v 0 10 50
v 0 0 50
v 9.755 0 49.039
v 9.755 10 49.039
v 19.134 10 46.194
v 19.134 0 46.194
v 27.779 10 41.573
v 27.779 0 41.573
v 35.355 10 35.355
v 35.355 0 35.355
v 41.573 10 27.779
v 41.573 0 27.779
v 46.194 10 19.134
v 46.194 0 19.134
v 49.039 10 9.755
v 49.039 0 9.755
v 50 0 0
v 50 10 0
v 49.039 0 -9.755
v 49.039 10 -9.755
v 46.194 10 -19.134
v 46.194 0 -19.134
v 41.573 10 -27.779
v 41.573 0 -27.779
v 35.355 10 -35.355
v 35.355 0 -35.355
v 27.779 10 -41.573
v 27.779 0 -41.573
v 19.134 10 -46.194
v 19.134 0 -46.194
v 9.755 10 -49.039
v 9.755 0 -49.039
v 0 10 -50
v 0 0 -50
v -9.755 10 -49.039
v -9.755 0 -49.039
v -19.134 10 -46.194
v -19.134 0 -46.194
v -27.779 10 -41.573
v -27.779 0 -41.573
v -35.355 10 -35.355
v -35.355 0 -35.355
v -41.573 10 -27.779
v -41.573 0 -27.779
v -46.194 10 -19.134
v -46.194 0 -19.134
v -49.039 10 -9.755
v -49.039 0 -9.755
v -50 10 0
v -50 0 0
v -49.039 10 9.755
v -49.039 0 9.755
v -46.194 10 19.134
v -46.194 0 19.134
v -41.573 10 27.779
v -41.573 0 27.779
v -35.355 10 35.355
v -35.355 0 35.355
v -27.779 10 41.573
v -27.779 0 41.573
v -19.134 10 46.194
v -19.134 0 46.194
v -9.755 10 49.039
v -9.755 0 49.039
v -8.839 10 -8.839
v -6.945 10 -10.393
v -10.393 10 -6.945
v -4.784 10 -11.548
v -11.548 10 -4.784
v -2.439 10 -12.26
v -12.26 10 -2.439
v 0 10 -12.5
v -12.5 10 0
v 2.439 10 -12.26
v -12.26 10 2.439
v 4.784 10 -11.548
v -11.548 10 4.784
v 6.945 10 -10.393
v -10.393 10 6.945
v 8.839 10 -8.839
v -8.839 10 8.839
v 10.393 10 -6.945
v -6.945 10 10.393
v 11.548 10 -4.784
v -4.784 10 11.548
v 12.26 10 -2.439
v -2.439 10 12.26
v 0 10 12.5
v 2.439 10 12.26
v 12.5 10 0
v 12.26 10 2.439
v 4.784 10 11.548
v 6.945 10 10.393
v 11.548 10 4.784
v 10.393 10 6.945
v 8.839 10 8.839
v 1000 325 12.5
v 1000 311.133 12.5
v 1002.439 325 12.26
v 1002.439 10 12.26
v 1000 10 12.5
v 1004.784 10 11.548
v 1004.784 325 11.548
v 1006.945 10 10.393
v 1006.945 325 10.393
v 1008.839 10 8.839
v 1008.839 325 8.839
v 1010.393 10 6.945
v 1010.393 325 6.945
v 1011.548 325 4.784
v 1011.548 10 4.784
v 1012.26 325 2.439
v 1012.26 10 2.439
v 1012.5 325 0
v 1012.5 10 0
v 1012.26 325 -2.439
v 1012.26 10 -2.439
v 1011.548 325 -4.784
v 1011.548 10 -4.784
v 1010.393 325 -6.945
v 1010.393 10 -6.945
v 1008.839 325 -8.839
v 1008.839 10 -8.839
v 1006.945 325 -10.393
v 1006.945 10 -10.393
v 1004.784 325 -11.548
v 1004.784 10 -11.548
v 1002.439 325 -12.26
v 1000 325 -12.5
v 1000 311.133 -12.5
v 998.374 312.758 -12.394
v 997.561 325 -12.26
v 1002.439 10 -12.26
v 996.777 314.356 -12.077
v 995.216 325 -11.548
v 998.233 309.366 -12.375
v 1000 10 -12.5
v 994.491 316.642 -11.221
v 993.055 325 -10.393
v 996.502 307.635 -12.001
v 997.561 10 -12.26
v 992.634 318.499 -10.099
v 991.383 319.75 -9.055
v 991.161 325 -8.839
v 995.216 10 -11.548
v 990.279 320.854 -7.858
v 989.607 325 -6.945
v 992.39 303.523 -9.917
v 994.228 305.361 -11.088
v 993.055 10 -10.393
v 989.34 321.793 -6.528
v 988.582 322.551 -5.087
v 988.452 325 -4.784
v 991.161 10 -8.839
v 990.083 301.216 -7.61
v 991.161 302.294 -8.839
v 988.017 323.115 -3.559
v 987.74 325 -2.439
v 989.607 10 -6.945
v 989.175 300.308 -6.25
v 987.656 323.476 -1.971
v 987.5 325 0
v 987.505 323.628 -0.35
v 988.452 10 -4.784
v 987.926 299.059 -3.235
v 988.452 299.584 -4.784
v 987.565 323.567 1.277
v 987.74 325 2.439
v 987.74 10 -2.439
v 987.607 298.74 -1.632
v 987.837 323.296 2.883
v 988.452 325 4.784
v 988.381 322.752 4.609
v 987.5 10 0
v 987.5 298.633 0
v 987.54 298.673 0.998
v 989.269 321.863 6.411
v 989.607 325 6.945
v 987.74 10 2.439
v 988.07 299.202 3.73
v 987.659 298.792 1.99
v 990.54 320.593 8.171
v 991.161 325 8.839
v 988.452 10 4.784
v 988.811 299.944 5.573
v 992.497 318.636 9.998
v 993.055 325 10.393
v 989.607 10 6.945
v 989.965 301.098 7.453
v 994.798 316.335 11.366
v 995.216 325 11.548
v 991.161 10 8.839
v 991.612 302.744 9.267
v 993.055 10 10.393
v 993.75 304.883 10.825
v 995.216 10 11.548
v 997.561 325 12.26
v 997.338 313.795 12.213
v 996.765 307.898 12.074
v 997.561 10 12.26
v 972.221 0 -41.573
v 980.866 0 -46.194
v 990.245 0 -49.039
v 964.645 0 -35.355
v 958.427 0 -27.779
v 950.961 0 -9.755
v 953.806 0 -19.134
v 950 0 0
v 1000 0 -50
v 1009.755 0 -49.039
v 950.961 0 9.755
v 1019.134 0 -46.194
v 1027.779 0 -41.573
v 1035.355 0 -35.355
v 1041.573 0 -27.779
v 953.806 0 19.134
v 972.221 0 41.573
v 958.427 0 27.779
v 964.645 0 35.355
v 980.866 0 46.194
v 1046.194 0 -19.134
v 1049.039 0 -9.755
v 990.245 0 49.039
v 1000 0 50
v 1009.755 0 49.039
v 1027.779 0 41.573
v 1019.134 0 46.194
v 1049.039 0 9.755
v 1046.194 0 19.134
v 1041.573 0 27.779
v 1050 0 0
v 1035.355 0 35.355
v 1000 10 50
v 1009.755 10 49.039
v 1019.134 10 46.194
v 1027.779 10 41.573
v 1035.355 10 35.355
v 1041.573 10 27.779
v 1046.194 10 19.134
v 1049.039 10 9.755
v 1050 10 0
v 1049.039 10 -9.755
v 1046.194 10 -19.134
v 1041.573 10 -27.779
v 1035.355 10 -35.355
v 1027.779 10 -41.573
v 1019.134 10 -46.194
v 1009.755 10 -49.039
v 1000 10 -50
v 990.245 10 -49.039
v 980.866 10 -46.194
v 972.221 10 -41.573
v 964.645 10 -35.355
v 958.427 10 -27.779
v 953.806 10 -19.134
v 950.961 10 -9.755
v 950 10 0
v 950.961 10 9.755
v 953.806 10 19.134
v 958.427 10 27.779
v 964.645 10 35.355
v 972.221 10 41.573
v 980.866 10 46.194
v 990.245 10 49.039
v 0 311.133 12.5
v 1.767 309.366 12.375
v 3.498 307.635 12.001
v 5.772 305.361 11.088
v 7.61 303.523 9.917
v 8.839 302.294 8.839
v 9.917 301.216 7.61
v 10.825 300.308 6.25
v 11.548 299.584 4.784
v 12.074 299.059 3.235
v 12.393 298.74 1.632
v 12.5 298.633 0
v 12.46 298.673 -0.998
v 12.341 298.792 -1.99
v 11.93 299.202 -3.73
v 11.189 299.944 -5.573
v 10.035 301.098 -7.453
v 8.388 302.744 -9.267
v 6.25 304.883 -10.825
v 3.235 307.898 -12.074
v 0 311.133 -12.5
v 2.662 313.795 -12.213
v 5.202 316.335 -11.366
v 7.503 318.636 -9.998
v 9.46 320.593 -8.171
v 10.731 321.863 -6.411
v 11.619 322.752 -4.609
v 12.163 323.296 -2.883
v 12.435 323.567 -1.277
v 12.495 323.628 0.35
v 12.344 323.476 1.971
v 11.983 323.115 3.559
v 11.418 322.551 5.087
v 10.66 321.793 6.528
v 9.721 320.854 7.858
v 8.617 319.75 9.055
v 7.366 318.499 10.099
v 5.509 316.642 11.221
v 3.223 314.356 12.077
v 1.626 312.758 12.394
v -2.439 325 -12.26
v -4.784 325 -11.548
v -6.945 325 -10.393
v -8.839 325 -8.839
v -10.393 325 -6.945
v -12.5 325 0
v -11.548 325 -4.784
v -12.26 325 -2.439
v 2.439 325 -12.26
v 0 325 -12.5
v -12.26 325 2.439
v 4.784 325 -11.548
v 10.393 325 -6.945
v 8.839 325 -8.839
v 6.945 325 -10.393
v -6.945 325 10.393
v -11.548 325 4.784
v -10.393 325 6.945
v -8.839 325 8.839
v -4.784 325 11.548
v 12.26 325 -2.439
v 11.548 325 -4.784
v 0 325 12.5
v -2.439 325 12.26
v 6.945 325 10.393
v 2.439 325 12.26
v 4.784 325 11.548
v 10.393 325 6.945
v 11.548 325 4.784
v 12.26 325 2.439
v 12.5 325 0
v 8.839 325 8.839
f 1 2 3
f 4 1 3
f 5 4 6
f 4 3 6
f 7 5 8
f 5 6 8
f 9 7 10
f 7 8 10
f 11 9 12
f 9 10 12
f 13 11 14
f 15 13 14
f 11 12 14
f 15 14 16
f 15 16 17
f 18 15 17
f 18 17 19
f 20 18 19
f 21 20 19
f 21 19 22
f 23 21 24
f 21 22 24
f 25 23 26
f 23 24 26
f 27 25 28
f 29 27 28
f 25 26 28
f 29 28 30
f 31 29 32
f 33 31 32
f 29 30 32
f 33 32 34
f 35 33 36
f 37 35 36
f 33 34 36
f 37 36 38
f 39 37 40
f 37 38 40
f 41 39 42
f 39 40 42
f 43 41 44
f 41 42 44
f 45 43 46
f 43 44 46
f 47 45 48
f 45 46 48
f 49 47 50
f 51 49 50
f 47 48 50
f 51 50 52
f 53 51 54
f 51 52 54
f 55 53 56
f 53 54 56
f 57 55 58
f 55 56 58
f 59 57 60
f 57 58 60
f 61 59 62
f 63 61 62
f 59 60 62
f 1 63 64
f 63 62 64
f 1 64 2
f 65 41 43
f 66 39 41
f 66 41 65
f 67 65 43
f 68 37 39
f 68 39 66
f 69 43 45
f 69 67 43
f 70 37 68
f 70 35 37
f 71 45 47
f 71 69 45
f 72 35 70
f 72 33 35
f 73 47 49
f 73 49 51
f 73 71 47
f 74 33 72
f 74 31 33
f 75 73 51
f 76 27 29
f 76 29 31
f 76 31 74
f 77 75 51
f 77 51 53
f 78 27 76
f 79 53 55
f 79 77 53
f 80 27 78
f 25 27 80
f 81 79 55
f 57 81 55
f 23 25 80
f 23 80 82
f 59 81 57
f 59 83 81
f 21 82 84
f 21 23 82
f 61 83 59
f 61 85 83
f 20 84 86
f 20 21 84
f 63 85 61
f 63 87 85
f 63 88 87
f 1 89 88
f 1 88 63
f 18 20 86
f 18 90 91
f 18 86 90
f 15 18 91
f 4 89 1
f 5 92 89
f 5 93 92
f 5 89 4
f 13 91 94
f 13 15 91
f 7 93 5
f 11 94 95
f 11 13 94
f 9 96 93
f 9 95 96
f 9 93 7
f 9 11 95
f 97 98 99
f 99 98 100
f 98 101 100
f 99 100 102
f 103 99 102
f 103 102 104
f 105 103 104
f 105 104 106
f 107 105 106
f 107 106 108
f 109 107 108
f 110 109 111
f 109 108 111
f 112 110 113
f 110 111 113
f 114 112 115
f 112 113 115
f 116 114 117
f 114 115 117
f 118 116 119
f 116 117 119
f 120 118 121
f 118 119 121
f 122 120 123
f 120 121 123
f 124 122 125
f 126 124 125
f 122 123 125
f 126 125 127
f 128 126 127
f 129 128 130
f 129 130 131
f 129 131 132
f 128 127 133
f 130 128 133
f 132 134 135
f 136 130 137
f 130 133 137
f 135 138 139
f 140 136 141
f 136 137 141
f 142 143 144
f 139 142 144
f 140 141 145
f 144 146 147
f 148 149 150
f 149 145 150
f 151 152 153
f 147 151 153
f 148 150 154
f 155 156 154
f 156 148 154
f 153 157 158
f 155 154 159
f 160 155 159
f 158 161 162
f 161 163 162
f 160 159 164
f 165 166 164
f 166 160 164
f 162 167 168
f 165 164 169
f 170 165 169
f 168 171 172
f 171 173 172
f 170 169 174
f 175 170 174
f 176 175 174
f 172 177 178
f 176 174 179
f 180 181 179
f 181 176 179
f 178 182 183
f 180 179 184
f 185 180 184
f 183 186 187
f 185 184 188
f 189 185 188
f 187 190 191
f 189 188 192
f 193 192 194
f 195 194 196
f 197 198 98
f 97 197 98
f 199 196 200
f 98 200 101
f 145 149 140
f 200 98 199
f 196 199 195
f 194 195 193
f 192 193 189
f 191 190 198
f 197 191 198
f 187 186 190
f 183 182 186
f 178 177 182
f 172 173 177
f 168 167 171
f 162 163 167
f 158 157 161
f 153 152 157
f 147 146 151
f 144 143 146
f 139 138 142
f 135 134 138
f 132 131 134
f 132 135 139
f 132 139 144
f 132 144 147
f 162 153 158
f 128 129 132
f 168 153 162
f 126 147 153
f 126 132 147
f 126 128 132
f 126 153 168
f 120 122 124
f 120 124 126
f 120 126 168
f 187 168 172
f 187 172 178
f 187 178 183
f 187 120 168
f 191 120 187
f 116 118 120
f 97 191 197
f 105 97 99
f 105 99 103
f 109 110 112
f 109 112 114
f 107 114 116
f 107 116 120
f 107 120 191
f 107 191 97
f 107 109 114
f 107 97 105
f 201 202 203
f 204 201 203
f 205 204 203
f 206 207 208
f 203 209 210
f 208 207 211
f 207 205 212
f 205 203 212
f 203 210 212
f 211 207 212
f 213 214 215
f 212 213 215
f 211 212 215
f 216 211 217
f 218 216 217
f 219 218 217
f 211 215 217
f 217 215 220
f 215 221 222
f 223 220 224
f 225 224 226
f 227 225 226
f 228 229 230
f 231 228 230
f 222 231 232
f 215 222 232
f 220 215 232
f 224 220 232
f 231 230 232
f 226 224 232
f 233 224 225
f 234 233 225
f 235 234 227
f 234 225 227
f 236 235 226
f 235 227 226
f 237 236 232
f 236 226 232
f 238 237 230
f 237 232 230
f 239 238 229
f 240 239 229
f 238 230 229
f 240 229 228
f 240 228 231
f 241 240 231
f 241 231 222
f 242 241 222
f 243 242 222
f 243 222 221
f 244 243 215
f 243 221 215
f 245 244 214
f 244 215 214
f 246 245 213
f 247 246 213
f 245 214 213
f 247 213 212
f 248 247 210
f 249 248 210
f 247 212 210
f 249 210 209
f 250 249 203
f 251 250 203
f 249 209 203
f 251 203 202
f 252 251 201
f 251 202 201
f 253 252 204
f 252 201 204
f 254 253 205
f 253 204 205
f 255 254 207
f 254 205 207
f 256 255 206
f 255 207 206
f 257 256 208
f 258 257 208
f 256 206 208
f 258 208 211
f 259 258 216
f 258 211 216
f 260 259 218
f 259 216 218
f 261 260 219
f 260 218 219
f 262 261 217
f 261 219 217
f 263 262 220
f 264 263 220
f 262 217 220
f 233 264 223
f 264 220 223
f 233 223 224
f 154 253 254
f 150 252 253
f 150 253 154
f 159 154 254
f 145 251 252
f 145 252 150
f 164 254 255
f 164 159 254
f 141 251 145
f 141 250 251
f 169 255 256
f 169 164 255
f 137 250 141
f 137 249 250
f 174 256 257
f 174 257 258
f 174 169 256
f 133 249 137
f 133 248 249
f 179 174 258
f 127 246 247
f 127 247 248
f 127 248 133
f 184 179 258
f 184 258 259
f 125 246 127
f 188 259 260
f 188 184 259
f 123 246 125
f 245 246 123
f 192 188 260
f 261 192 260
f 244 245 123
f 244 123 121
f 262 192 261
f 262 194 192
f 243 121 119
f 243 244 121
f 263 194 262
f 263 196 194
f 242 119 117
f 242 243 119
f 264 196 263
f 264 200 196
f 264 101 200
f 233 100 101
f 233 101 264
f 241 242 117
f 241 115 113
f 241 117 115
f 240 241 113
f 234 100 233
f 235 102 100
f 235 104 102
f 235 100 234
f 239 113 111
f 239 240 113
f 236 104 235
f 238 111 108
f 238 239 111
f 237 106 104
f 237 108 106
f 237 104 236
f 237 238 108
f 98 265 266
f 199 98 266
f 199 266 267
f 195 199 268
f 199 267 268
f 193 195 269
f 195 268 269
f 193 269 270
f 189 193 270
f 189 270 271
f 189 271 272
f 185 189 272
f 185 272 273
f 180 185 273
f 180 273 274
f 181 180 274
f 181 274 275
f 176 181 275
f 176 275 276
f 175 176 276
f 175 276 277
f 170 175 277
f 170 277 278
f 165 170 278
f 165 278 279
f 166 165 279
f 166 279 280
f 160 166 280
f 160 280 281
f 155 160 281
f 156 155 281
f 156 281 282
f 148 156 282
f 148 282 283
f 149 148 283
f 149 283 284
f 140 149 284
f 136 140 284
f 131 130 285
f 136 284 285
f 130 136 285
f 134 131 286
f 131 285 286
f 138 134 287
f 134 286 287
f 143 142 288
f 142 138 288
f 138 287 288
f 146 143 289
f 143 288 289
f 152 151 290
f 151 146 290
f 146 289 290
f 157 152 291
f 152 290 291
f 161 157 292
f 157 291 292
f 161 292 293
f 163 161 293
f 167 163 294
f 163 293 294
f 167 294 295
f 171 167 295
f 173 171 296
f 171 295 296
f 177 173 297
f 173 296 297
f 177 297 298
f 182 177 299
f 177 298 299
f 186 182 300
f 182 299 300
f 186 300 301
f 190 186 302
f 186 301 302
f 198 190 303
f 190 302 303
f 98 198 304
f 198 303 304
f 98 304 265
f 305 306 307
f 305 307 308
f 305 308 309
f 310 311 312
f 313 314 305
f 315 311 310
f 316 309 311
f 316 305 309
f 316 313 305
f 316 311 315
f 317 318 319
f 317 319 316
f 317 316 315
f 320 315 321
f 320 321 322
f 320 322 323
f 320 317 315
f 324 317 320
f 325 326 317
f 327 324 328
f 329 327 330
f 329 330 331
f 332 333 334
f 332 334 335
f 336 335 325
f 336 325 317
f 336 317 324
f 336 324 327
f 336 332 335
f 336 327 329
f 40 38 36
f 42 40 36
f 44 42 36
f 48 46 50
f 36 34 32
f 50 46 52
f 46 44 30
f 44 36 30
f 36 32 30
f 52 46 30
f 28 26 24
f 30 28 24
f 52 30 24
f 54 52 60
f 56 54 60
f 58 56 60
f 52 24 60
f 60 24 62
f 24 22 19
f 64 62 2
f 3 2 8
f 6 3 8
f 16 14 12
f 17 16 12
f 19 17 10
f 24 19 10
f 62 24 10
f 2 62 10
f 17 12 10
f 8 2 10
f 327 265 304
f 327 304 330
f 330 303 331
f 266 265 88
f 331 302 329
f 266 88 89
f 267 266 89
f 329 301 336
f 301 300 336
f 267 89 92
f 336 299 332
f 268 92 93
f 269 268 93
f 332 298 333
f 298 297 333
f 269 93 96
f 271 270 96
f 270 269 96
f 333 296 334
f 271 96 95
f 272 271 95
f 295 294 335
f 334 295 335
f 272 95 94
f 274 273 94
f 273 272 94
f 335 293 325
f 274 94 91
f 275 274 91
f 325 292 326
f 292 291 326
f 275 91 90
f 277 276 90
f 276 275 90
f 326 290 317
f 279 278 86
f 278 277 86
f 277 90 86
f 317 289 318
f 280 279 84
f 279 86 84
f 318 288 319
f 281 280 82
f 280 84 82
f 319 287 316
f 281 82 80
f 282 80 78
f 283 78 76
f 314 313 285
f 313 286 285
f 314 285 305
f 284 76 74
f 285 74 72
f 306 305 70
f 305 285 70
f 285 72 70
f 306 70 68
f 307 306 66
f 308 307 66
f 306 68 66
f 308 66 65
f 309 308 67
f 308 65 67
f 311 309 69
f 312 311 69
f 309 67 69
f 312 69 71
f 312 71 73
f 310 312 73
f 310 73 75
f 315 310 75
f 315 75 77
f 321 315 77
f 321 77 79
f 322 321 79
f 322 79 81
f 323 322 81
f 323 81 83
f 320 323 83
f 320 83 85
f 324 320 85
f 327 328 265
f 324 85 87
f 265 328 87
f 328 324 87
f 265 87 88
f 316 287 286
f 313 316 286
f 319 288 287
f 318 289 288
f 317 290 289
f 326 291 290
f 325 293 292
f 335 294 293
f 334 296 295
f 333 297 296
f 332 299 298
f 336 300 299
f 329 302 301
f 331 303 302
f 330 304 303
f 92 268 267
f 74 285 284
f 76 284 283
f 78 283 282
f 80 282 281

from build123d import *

# Parameters (mm, degrees)
SKETCH_1_R        = 50
EXTRUDE_1_DEPTH   = 10
EXTRUDE_1_2_DEPTH = 10
SKETCH_2_R        = 12.5
EXTRUDE_2_DEPTH   = 315
SKETCH_3_R        = 12.5
EXTRUDE_3_DEPTH   = 1000


with BuildPart() as part:
    # 草图1 → 凸台-拉伸1 (new body)
    with BuildSketch(Plane(origin=(0, 0, 0), x_dir=(1, 0, 0), z_dir=(0, 1, 0))):
        Circle(SKETCH_1_R)
    extrude(amount=EXTRUDE_1_DEPTH)



with BuildPart() as body_2:
    # 草图1 → Extrude 1 2 (new body)
    with BuildSketch(Plane(origin=(0, 0, 0), x_dir=(1, 0, 0), z_dir=(0, 1, 0))):
        with Locations((1000, 0)):
            Circle(SKETCH_1_R)
    extrude(amount=EXTRUDE_1_2_DEPTH)


with BuildPart() as part_1:
    add(part.part)

    add(body_2.part)  # 凸台-拉伸2 merges body 2
    # 草图2 → 凸台-拉伸2 (add)
    with BuildSketch(Plane(origin=(0, 10, 0), x_dir=(1, 0, 0), z_dir=(0, 1, 0))):
        Circle(SKETCH_2_R)
        with Locations((1000, 0)):
            Circle(SKETCH_2_R)
    extrude(amount=EXTRUDE_2_DEPTH)


with BuildPart() as extrude_3_tool:
    # 草图3 → 凸台-拉伸3 (new body)
    with BuildSketch(Plane(origin=(0, 0, 0), x_dir=(0, 0, -1), z_dir=(1, 0, 0))):
        with Locations((0, 311.132818199)):
            Circle(SKETCH_3_R)
    extrude(amount=EXTRUDE_3_DEPTH)


with BuildPart() as part_2:
    add(part_1.part)


with BuildPart() as part_3:
    # 凸台-拉伸3: joined with extrude_3_tool
    add(part_2.part.fuse(extrude_3_tool.part, tol=0.00001))


solid = part_3.part
